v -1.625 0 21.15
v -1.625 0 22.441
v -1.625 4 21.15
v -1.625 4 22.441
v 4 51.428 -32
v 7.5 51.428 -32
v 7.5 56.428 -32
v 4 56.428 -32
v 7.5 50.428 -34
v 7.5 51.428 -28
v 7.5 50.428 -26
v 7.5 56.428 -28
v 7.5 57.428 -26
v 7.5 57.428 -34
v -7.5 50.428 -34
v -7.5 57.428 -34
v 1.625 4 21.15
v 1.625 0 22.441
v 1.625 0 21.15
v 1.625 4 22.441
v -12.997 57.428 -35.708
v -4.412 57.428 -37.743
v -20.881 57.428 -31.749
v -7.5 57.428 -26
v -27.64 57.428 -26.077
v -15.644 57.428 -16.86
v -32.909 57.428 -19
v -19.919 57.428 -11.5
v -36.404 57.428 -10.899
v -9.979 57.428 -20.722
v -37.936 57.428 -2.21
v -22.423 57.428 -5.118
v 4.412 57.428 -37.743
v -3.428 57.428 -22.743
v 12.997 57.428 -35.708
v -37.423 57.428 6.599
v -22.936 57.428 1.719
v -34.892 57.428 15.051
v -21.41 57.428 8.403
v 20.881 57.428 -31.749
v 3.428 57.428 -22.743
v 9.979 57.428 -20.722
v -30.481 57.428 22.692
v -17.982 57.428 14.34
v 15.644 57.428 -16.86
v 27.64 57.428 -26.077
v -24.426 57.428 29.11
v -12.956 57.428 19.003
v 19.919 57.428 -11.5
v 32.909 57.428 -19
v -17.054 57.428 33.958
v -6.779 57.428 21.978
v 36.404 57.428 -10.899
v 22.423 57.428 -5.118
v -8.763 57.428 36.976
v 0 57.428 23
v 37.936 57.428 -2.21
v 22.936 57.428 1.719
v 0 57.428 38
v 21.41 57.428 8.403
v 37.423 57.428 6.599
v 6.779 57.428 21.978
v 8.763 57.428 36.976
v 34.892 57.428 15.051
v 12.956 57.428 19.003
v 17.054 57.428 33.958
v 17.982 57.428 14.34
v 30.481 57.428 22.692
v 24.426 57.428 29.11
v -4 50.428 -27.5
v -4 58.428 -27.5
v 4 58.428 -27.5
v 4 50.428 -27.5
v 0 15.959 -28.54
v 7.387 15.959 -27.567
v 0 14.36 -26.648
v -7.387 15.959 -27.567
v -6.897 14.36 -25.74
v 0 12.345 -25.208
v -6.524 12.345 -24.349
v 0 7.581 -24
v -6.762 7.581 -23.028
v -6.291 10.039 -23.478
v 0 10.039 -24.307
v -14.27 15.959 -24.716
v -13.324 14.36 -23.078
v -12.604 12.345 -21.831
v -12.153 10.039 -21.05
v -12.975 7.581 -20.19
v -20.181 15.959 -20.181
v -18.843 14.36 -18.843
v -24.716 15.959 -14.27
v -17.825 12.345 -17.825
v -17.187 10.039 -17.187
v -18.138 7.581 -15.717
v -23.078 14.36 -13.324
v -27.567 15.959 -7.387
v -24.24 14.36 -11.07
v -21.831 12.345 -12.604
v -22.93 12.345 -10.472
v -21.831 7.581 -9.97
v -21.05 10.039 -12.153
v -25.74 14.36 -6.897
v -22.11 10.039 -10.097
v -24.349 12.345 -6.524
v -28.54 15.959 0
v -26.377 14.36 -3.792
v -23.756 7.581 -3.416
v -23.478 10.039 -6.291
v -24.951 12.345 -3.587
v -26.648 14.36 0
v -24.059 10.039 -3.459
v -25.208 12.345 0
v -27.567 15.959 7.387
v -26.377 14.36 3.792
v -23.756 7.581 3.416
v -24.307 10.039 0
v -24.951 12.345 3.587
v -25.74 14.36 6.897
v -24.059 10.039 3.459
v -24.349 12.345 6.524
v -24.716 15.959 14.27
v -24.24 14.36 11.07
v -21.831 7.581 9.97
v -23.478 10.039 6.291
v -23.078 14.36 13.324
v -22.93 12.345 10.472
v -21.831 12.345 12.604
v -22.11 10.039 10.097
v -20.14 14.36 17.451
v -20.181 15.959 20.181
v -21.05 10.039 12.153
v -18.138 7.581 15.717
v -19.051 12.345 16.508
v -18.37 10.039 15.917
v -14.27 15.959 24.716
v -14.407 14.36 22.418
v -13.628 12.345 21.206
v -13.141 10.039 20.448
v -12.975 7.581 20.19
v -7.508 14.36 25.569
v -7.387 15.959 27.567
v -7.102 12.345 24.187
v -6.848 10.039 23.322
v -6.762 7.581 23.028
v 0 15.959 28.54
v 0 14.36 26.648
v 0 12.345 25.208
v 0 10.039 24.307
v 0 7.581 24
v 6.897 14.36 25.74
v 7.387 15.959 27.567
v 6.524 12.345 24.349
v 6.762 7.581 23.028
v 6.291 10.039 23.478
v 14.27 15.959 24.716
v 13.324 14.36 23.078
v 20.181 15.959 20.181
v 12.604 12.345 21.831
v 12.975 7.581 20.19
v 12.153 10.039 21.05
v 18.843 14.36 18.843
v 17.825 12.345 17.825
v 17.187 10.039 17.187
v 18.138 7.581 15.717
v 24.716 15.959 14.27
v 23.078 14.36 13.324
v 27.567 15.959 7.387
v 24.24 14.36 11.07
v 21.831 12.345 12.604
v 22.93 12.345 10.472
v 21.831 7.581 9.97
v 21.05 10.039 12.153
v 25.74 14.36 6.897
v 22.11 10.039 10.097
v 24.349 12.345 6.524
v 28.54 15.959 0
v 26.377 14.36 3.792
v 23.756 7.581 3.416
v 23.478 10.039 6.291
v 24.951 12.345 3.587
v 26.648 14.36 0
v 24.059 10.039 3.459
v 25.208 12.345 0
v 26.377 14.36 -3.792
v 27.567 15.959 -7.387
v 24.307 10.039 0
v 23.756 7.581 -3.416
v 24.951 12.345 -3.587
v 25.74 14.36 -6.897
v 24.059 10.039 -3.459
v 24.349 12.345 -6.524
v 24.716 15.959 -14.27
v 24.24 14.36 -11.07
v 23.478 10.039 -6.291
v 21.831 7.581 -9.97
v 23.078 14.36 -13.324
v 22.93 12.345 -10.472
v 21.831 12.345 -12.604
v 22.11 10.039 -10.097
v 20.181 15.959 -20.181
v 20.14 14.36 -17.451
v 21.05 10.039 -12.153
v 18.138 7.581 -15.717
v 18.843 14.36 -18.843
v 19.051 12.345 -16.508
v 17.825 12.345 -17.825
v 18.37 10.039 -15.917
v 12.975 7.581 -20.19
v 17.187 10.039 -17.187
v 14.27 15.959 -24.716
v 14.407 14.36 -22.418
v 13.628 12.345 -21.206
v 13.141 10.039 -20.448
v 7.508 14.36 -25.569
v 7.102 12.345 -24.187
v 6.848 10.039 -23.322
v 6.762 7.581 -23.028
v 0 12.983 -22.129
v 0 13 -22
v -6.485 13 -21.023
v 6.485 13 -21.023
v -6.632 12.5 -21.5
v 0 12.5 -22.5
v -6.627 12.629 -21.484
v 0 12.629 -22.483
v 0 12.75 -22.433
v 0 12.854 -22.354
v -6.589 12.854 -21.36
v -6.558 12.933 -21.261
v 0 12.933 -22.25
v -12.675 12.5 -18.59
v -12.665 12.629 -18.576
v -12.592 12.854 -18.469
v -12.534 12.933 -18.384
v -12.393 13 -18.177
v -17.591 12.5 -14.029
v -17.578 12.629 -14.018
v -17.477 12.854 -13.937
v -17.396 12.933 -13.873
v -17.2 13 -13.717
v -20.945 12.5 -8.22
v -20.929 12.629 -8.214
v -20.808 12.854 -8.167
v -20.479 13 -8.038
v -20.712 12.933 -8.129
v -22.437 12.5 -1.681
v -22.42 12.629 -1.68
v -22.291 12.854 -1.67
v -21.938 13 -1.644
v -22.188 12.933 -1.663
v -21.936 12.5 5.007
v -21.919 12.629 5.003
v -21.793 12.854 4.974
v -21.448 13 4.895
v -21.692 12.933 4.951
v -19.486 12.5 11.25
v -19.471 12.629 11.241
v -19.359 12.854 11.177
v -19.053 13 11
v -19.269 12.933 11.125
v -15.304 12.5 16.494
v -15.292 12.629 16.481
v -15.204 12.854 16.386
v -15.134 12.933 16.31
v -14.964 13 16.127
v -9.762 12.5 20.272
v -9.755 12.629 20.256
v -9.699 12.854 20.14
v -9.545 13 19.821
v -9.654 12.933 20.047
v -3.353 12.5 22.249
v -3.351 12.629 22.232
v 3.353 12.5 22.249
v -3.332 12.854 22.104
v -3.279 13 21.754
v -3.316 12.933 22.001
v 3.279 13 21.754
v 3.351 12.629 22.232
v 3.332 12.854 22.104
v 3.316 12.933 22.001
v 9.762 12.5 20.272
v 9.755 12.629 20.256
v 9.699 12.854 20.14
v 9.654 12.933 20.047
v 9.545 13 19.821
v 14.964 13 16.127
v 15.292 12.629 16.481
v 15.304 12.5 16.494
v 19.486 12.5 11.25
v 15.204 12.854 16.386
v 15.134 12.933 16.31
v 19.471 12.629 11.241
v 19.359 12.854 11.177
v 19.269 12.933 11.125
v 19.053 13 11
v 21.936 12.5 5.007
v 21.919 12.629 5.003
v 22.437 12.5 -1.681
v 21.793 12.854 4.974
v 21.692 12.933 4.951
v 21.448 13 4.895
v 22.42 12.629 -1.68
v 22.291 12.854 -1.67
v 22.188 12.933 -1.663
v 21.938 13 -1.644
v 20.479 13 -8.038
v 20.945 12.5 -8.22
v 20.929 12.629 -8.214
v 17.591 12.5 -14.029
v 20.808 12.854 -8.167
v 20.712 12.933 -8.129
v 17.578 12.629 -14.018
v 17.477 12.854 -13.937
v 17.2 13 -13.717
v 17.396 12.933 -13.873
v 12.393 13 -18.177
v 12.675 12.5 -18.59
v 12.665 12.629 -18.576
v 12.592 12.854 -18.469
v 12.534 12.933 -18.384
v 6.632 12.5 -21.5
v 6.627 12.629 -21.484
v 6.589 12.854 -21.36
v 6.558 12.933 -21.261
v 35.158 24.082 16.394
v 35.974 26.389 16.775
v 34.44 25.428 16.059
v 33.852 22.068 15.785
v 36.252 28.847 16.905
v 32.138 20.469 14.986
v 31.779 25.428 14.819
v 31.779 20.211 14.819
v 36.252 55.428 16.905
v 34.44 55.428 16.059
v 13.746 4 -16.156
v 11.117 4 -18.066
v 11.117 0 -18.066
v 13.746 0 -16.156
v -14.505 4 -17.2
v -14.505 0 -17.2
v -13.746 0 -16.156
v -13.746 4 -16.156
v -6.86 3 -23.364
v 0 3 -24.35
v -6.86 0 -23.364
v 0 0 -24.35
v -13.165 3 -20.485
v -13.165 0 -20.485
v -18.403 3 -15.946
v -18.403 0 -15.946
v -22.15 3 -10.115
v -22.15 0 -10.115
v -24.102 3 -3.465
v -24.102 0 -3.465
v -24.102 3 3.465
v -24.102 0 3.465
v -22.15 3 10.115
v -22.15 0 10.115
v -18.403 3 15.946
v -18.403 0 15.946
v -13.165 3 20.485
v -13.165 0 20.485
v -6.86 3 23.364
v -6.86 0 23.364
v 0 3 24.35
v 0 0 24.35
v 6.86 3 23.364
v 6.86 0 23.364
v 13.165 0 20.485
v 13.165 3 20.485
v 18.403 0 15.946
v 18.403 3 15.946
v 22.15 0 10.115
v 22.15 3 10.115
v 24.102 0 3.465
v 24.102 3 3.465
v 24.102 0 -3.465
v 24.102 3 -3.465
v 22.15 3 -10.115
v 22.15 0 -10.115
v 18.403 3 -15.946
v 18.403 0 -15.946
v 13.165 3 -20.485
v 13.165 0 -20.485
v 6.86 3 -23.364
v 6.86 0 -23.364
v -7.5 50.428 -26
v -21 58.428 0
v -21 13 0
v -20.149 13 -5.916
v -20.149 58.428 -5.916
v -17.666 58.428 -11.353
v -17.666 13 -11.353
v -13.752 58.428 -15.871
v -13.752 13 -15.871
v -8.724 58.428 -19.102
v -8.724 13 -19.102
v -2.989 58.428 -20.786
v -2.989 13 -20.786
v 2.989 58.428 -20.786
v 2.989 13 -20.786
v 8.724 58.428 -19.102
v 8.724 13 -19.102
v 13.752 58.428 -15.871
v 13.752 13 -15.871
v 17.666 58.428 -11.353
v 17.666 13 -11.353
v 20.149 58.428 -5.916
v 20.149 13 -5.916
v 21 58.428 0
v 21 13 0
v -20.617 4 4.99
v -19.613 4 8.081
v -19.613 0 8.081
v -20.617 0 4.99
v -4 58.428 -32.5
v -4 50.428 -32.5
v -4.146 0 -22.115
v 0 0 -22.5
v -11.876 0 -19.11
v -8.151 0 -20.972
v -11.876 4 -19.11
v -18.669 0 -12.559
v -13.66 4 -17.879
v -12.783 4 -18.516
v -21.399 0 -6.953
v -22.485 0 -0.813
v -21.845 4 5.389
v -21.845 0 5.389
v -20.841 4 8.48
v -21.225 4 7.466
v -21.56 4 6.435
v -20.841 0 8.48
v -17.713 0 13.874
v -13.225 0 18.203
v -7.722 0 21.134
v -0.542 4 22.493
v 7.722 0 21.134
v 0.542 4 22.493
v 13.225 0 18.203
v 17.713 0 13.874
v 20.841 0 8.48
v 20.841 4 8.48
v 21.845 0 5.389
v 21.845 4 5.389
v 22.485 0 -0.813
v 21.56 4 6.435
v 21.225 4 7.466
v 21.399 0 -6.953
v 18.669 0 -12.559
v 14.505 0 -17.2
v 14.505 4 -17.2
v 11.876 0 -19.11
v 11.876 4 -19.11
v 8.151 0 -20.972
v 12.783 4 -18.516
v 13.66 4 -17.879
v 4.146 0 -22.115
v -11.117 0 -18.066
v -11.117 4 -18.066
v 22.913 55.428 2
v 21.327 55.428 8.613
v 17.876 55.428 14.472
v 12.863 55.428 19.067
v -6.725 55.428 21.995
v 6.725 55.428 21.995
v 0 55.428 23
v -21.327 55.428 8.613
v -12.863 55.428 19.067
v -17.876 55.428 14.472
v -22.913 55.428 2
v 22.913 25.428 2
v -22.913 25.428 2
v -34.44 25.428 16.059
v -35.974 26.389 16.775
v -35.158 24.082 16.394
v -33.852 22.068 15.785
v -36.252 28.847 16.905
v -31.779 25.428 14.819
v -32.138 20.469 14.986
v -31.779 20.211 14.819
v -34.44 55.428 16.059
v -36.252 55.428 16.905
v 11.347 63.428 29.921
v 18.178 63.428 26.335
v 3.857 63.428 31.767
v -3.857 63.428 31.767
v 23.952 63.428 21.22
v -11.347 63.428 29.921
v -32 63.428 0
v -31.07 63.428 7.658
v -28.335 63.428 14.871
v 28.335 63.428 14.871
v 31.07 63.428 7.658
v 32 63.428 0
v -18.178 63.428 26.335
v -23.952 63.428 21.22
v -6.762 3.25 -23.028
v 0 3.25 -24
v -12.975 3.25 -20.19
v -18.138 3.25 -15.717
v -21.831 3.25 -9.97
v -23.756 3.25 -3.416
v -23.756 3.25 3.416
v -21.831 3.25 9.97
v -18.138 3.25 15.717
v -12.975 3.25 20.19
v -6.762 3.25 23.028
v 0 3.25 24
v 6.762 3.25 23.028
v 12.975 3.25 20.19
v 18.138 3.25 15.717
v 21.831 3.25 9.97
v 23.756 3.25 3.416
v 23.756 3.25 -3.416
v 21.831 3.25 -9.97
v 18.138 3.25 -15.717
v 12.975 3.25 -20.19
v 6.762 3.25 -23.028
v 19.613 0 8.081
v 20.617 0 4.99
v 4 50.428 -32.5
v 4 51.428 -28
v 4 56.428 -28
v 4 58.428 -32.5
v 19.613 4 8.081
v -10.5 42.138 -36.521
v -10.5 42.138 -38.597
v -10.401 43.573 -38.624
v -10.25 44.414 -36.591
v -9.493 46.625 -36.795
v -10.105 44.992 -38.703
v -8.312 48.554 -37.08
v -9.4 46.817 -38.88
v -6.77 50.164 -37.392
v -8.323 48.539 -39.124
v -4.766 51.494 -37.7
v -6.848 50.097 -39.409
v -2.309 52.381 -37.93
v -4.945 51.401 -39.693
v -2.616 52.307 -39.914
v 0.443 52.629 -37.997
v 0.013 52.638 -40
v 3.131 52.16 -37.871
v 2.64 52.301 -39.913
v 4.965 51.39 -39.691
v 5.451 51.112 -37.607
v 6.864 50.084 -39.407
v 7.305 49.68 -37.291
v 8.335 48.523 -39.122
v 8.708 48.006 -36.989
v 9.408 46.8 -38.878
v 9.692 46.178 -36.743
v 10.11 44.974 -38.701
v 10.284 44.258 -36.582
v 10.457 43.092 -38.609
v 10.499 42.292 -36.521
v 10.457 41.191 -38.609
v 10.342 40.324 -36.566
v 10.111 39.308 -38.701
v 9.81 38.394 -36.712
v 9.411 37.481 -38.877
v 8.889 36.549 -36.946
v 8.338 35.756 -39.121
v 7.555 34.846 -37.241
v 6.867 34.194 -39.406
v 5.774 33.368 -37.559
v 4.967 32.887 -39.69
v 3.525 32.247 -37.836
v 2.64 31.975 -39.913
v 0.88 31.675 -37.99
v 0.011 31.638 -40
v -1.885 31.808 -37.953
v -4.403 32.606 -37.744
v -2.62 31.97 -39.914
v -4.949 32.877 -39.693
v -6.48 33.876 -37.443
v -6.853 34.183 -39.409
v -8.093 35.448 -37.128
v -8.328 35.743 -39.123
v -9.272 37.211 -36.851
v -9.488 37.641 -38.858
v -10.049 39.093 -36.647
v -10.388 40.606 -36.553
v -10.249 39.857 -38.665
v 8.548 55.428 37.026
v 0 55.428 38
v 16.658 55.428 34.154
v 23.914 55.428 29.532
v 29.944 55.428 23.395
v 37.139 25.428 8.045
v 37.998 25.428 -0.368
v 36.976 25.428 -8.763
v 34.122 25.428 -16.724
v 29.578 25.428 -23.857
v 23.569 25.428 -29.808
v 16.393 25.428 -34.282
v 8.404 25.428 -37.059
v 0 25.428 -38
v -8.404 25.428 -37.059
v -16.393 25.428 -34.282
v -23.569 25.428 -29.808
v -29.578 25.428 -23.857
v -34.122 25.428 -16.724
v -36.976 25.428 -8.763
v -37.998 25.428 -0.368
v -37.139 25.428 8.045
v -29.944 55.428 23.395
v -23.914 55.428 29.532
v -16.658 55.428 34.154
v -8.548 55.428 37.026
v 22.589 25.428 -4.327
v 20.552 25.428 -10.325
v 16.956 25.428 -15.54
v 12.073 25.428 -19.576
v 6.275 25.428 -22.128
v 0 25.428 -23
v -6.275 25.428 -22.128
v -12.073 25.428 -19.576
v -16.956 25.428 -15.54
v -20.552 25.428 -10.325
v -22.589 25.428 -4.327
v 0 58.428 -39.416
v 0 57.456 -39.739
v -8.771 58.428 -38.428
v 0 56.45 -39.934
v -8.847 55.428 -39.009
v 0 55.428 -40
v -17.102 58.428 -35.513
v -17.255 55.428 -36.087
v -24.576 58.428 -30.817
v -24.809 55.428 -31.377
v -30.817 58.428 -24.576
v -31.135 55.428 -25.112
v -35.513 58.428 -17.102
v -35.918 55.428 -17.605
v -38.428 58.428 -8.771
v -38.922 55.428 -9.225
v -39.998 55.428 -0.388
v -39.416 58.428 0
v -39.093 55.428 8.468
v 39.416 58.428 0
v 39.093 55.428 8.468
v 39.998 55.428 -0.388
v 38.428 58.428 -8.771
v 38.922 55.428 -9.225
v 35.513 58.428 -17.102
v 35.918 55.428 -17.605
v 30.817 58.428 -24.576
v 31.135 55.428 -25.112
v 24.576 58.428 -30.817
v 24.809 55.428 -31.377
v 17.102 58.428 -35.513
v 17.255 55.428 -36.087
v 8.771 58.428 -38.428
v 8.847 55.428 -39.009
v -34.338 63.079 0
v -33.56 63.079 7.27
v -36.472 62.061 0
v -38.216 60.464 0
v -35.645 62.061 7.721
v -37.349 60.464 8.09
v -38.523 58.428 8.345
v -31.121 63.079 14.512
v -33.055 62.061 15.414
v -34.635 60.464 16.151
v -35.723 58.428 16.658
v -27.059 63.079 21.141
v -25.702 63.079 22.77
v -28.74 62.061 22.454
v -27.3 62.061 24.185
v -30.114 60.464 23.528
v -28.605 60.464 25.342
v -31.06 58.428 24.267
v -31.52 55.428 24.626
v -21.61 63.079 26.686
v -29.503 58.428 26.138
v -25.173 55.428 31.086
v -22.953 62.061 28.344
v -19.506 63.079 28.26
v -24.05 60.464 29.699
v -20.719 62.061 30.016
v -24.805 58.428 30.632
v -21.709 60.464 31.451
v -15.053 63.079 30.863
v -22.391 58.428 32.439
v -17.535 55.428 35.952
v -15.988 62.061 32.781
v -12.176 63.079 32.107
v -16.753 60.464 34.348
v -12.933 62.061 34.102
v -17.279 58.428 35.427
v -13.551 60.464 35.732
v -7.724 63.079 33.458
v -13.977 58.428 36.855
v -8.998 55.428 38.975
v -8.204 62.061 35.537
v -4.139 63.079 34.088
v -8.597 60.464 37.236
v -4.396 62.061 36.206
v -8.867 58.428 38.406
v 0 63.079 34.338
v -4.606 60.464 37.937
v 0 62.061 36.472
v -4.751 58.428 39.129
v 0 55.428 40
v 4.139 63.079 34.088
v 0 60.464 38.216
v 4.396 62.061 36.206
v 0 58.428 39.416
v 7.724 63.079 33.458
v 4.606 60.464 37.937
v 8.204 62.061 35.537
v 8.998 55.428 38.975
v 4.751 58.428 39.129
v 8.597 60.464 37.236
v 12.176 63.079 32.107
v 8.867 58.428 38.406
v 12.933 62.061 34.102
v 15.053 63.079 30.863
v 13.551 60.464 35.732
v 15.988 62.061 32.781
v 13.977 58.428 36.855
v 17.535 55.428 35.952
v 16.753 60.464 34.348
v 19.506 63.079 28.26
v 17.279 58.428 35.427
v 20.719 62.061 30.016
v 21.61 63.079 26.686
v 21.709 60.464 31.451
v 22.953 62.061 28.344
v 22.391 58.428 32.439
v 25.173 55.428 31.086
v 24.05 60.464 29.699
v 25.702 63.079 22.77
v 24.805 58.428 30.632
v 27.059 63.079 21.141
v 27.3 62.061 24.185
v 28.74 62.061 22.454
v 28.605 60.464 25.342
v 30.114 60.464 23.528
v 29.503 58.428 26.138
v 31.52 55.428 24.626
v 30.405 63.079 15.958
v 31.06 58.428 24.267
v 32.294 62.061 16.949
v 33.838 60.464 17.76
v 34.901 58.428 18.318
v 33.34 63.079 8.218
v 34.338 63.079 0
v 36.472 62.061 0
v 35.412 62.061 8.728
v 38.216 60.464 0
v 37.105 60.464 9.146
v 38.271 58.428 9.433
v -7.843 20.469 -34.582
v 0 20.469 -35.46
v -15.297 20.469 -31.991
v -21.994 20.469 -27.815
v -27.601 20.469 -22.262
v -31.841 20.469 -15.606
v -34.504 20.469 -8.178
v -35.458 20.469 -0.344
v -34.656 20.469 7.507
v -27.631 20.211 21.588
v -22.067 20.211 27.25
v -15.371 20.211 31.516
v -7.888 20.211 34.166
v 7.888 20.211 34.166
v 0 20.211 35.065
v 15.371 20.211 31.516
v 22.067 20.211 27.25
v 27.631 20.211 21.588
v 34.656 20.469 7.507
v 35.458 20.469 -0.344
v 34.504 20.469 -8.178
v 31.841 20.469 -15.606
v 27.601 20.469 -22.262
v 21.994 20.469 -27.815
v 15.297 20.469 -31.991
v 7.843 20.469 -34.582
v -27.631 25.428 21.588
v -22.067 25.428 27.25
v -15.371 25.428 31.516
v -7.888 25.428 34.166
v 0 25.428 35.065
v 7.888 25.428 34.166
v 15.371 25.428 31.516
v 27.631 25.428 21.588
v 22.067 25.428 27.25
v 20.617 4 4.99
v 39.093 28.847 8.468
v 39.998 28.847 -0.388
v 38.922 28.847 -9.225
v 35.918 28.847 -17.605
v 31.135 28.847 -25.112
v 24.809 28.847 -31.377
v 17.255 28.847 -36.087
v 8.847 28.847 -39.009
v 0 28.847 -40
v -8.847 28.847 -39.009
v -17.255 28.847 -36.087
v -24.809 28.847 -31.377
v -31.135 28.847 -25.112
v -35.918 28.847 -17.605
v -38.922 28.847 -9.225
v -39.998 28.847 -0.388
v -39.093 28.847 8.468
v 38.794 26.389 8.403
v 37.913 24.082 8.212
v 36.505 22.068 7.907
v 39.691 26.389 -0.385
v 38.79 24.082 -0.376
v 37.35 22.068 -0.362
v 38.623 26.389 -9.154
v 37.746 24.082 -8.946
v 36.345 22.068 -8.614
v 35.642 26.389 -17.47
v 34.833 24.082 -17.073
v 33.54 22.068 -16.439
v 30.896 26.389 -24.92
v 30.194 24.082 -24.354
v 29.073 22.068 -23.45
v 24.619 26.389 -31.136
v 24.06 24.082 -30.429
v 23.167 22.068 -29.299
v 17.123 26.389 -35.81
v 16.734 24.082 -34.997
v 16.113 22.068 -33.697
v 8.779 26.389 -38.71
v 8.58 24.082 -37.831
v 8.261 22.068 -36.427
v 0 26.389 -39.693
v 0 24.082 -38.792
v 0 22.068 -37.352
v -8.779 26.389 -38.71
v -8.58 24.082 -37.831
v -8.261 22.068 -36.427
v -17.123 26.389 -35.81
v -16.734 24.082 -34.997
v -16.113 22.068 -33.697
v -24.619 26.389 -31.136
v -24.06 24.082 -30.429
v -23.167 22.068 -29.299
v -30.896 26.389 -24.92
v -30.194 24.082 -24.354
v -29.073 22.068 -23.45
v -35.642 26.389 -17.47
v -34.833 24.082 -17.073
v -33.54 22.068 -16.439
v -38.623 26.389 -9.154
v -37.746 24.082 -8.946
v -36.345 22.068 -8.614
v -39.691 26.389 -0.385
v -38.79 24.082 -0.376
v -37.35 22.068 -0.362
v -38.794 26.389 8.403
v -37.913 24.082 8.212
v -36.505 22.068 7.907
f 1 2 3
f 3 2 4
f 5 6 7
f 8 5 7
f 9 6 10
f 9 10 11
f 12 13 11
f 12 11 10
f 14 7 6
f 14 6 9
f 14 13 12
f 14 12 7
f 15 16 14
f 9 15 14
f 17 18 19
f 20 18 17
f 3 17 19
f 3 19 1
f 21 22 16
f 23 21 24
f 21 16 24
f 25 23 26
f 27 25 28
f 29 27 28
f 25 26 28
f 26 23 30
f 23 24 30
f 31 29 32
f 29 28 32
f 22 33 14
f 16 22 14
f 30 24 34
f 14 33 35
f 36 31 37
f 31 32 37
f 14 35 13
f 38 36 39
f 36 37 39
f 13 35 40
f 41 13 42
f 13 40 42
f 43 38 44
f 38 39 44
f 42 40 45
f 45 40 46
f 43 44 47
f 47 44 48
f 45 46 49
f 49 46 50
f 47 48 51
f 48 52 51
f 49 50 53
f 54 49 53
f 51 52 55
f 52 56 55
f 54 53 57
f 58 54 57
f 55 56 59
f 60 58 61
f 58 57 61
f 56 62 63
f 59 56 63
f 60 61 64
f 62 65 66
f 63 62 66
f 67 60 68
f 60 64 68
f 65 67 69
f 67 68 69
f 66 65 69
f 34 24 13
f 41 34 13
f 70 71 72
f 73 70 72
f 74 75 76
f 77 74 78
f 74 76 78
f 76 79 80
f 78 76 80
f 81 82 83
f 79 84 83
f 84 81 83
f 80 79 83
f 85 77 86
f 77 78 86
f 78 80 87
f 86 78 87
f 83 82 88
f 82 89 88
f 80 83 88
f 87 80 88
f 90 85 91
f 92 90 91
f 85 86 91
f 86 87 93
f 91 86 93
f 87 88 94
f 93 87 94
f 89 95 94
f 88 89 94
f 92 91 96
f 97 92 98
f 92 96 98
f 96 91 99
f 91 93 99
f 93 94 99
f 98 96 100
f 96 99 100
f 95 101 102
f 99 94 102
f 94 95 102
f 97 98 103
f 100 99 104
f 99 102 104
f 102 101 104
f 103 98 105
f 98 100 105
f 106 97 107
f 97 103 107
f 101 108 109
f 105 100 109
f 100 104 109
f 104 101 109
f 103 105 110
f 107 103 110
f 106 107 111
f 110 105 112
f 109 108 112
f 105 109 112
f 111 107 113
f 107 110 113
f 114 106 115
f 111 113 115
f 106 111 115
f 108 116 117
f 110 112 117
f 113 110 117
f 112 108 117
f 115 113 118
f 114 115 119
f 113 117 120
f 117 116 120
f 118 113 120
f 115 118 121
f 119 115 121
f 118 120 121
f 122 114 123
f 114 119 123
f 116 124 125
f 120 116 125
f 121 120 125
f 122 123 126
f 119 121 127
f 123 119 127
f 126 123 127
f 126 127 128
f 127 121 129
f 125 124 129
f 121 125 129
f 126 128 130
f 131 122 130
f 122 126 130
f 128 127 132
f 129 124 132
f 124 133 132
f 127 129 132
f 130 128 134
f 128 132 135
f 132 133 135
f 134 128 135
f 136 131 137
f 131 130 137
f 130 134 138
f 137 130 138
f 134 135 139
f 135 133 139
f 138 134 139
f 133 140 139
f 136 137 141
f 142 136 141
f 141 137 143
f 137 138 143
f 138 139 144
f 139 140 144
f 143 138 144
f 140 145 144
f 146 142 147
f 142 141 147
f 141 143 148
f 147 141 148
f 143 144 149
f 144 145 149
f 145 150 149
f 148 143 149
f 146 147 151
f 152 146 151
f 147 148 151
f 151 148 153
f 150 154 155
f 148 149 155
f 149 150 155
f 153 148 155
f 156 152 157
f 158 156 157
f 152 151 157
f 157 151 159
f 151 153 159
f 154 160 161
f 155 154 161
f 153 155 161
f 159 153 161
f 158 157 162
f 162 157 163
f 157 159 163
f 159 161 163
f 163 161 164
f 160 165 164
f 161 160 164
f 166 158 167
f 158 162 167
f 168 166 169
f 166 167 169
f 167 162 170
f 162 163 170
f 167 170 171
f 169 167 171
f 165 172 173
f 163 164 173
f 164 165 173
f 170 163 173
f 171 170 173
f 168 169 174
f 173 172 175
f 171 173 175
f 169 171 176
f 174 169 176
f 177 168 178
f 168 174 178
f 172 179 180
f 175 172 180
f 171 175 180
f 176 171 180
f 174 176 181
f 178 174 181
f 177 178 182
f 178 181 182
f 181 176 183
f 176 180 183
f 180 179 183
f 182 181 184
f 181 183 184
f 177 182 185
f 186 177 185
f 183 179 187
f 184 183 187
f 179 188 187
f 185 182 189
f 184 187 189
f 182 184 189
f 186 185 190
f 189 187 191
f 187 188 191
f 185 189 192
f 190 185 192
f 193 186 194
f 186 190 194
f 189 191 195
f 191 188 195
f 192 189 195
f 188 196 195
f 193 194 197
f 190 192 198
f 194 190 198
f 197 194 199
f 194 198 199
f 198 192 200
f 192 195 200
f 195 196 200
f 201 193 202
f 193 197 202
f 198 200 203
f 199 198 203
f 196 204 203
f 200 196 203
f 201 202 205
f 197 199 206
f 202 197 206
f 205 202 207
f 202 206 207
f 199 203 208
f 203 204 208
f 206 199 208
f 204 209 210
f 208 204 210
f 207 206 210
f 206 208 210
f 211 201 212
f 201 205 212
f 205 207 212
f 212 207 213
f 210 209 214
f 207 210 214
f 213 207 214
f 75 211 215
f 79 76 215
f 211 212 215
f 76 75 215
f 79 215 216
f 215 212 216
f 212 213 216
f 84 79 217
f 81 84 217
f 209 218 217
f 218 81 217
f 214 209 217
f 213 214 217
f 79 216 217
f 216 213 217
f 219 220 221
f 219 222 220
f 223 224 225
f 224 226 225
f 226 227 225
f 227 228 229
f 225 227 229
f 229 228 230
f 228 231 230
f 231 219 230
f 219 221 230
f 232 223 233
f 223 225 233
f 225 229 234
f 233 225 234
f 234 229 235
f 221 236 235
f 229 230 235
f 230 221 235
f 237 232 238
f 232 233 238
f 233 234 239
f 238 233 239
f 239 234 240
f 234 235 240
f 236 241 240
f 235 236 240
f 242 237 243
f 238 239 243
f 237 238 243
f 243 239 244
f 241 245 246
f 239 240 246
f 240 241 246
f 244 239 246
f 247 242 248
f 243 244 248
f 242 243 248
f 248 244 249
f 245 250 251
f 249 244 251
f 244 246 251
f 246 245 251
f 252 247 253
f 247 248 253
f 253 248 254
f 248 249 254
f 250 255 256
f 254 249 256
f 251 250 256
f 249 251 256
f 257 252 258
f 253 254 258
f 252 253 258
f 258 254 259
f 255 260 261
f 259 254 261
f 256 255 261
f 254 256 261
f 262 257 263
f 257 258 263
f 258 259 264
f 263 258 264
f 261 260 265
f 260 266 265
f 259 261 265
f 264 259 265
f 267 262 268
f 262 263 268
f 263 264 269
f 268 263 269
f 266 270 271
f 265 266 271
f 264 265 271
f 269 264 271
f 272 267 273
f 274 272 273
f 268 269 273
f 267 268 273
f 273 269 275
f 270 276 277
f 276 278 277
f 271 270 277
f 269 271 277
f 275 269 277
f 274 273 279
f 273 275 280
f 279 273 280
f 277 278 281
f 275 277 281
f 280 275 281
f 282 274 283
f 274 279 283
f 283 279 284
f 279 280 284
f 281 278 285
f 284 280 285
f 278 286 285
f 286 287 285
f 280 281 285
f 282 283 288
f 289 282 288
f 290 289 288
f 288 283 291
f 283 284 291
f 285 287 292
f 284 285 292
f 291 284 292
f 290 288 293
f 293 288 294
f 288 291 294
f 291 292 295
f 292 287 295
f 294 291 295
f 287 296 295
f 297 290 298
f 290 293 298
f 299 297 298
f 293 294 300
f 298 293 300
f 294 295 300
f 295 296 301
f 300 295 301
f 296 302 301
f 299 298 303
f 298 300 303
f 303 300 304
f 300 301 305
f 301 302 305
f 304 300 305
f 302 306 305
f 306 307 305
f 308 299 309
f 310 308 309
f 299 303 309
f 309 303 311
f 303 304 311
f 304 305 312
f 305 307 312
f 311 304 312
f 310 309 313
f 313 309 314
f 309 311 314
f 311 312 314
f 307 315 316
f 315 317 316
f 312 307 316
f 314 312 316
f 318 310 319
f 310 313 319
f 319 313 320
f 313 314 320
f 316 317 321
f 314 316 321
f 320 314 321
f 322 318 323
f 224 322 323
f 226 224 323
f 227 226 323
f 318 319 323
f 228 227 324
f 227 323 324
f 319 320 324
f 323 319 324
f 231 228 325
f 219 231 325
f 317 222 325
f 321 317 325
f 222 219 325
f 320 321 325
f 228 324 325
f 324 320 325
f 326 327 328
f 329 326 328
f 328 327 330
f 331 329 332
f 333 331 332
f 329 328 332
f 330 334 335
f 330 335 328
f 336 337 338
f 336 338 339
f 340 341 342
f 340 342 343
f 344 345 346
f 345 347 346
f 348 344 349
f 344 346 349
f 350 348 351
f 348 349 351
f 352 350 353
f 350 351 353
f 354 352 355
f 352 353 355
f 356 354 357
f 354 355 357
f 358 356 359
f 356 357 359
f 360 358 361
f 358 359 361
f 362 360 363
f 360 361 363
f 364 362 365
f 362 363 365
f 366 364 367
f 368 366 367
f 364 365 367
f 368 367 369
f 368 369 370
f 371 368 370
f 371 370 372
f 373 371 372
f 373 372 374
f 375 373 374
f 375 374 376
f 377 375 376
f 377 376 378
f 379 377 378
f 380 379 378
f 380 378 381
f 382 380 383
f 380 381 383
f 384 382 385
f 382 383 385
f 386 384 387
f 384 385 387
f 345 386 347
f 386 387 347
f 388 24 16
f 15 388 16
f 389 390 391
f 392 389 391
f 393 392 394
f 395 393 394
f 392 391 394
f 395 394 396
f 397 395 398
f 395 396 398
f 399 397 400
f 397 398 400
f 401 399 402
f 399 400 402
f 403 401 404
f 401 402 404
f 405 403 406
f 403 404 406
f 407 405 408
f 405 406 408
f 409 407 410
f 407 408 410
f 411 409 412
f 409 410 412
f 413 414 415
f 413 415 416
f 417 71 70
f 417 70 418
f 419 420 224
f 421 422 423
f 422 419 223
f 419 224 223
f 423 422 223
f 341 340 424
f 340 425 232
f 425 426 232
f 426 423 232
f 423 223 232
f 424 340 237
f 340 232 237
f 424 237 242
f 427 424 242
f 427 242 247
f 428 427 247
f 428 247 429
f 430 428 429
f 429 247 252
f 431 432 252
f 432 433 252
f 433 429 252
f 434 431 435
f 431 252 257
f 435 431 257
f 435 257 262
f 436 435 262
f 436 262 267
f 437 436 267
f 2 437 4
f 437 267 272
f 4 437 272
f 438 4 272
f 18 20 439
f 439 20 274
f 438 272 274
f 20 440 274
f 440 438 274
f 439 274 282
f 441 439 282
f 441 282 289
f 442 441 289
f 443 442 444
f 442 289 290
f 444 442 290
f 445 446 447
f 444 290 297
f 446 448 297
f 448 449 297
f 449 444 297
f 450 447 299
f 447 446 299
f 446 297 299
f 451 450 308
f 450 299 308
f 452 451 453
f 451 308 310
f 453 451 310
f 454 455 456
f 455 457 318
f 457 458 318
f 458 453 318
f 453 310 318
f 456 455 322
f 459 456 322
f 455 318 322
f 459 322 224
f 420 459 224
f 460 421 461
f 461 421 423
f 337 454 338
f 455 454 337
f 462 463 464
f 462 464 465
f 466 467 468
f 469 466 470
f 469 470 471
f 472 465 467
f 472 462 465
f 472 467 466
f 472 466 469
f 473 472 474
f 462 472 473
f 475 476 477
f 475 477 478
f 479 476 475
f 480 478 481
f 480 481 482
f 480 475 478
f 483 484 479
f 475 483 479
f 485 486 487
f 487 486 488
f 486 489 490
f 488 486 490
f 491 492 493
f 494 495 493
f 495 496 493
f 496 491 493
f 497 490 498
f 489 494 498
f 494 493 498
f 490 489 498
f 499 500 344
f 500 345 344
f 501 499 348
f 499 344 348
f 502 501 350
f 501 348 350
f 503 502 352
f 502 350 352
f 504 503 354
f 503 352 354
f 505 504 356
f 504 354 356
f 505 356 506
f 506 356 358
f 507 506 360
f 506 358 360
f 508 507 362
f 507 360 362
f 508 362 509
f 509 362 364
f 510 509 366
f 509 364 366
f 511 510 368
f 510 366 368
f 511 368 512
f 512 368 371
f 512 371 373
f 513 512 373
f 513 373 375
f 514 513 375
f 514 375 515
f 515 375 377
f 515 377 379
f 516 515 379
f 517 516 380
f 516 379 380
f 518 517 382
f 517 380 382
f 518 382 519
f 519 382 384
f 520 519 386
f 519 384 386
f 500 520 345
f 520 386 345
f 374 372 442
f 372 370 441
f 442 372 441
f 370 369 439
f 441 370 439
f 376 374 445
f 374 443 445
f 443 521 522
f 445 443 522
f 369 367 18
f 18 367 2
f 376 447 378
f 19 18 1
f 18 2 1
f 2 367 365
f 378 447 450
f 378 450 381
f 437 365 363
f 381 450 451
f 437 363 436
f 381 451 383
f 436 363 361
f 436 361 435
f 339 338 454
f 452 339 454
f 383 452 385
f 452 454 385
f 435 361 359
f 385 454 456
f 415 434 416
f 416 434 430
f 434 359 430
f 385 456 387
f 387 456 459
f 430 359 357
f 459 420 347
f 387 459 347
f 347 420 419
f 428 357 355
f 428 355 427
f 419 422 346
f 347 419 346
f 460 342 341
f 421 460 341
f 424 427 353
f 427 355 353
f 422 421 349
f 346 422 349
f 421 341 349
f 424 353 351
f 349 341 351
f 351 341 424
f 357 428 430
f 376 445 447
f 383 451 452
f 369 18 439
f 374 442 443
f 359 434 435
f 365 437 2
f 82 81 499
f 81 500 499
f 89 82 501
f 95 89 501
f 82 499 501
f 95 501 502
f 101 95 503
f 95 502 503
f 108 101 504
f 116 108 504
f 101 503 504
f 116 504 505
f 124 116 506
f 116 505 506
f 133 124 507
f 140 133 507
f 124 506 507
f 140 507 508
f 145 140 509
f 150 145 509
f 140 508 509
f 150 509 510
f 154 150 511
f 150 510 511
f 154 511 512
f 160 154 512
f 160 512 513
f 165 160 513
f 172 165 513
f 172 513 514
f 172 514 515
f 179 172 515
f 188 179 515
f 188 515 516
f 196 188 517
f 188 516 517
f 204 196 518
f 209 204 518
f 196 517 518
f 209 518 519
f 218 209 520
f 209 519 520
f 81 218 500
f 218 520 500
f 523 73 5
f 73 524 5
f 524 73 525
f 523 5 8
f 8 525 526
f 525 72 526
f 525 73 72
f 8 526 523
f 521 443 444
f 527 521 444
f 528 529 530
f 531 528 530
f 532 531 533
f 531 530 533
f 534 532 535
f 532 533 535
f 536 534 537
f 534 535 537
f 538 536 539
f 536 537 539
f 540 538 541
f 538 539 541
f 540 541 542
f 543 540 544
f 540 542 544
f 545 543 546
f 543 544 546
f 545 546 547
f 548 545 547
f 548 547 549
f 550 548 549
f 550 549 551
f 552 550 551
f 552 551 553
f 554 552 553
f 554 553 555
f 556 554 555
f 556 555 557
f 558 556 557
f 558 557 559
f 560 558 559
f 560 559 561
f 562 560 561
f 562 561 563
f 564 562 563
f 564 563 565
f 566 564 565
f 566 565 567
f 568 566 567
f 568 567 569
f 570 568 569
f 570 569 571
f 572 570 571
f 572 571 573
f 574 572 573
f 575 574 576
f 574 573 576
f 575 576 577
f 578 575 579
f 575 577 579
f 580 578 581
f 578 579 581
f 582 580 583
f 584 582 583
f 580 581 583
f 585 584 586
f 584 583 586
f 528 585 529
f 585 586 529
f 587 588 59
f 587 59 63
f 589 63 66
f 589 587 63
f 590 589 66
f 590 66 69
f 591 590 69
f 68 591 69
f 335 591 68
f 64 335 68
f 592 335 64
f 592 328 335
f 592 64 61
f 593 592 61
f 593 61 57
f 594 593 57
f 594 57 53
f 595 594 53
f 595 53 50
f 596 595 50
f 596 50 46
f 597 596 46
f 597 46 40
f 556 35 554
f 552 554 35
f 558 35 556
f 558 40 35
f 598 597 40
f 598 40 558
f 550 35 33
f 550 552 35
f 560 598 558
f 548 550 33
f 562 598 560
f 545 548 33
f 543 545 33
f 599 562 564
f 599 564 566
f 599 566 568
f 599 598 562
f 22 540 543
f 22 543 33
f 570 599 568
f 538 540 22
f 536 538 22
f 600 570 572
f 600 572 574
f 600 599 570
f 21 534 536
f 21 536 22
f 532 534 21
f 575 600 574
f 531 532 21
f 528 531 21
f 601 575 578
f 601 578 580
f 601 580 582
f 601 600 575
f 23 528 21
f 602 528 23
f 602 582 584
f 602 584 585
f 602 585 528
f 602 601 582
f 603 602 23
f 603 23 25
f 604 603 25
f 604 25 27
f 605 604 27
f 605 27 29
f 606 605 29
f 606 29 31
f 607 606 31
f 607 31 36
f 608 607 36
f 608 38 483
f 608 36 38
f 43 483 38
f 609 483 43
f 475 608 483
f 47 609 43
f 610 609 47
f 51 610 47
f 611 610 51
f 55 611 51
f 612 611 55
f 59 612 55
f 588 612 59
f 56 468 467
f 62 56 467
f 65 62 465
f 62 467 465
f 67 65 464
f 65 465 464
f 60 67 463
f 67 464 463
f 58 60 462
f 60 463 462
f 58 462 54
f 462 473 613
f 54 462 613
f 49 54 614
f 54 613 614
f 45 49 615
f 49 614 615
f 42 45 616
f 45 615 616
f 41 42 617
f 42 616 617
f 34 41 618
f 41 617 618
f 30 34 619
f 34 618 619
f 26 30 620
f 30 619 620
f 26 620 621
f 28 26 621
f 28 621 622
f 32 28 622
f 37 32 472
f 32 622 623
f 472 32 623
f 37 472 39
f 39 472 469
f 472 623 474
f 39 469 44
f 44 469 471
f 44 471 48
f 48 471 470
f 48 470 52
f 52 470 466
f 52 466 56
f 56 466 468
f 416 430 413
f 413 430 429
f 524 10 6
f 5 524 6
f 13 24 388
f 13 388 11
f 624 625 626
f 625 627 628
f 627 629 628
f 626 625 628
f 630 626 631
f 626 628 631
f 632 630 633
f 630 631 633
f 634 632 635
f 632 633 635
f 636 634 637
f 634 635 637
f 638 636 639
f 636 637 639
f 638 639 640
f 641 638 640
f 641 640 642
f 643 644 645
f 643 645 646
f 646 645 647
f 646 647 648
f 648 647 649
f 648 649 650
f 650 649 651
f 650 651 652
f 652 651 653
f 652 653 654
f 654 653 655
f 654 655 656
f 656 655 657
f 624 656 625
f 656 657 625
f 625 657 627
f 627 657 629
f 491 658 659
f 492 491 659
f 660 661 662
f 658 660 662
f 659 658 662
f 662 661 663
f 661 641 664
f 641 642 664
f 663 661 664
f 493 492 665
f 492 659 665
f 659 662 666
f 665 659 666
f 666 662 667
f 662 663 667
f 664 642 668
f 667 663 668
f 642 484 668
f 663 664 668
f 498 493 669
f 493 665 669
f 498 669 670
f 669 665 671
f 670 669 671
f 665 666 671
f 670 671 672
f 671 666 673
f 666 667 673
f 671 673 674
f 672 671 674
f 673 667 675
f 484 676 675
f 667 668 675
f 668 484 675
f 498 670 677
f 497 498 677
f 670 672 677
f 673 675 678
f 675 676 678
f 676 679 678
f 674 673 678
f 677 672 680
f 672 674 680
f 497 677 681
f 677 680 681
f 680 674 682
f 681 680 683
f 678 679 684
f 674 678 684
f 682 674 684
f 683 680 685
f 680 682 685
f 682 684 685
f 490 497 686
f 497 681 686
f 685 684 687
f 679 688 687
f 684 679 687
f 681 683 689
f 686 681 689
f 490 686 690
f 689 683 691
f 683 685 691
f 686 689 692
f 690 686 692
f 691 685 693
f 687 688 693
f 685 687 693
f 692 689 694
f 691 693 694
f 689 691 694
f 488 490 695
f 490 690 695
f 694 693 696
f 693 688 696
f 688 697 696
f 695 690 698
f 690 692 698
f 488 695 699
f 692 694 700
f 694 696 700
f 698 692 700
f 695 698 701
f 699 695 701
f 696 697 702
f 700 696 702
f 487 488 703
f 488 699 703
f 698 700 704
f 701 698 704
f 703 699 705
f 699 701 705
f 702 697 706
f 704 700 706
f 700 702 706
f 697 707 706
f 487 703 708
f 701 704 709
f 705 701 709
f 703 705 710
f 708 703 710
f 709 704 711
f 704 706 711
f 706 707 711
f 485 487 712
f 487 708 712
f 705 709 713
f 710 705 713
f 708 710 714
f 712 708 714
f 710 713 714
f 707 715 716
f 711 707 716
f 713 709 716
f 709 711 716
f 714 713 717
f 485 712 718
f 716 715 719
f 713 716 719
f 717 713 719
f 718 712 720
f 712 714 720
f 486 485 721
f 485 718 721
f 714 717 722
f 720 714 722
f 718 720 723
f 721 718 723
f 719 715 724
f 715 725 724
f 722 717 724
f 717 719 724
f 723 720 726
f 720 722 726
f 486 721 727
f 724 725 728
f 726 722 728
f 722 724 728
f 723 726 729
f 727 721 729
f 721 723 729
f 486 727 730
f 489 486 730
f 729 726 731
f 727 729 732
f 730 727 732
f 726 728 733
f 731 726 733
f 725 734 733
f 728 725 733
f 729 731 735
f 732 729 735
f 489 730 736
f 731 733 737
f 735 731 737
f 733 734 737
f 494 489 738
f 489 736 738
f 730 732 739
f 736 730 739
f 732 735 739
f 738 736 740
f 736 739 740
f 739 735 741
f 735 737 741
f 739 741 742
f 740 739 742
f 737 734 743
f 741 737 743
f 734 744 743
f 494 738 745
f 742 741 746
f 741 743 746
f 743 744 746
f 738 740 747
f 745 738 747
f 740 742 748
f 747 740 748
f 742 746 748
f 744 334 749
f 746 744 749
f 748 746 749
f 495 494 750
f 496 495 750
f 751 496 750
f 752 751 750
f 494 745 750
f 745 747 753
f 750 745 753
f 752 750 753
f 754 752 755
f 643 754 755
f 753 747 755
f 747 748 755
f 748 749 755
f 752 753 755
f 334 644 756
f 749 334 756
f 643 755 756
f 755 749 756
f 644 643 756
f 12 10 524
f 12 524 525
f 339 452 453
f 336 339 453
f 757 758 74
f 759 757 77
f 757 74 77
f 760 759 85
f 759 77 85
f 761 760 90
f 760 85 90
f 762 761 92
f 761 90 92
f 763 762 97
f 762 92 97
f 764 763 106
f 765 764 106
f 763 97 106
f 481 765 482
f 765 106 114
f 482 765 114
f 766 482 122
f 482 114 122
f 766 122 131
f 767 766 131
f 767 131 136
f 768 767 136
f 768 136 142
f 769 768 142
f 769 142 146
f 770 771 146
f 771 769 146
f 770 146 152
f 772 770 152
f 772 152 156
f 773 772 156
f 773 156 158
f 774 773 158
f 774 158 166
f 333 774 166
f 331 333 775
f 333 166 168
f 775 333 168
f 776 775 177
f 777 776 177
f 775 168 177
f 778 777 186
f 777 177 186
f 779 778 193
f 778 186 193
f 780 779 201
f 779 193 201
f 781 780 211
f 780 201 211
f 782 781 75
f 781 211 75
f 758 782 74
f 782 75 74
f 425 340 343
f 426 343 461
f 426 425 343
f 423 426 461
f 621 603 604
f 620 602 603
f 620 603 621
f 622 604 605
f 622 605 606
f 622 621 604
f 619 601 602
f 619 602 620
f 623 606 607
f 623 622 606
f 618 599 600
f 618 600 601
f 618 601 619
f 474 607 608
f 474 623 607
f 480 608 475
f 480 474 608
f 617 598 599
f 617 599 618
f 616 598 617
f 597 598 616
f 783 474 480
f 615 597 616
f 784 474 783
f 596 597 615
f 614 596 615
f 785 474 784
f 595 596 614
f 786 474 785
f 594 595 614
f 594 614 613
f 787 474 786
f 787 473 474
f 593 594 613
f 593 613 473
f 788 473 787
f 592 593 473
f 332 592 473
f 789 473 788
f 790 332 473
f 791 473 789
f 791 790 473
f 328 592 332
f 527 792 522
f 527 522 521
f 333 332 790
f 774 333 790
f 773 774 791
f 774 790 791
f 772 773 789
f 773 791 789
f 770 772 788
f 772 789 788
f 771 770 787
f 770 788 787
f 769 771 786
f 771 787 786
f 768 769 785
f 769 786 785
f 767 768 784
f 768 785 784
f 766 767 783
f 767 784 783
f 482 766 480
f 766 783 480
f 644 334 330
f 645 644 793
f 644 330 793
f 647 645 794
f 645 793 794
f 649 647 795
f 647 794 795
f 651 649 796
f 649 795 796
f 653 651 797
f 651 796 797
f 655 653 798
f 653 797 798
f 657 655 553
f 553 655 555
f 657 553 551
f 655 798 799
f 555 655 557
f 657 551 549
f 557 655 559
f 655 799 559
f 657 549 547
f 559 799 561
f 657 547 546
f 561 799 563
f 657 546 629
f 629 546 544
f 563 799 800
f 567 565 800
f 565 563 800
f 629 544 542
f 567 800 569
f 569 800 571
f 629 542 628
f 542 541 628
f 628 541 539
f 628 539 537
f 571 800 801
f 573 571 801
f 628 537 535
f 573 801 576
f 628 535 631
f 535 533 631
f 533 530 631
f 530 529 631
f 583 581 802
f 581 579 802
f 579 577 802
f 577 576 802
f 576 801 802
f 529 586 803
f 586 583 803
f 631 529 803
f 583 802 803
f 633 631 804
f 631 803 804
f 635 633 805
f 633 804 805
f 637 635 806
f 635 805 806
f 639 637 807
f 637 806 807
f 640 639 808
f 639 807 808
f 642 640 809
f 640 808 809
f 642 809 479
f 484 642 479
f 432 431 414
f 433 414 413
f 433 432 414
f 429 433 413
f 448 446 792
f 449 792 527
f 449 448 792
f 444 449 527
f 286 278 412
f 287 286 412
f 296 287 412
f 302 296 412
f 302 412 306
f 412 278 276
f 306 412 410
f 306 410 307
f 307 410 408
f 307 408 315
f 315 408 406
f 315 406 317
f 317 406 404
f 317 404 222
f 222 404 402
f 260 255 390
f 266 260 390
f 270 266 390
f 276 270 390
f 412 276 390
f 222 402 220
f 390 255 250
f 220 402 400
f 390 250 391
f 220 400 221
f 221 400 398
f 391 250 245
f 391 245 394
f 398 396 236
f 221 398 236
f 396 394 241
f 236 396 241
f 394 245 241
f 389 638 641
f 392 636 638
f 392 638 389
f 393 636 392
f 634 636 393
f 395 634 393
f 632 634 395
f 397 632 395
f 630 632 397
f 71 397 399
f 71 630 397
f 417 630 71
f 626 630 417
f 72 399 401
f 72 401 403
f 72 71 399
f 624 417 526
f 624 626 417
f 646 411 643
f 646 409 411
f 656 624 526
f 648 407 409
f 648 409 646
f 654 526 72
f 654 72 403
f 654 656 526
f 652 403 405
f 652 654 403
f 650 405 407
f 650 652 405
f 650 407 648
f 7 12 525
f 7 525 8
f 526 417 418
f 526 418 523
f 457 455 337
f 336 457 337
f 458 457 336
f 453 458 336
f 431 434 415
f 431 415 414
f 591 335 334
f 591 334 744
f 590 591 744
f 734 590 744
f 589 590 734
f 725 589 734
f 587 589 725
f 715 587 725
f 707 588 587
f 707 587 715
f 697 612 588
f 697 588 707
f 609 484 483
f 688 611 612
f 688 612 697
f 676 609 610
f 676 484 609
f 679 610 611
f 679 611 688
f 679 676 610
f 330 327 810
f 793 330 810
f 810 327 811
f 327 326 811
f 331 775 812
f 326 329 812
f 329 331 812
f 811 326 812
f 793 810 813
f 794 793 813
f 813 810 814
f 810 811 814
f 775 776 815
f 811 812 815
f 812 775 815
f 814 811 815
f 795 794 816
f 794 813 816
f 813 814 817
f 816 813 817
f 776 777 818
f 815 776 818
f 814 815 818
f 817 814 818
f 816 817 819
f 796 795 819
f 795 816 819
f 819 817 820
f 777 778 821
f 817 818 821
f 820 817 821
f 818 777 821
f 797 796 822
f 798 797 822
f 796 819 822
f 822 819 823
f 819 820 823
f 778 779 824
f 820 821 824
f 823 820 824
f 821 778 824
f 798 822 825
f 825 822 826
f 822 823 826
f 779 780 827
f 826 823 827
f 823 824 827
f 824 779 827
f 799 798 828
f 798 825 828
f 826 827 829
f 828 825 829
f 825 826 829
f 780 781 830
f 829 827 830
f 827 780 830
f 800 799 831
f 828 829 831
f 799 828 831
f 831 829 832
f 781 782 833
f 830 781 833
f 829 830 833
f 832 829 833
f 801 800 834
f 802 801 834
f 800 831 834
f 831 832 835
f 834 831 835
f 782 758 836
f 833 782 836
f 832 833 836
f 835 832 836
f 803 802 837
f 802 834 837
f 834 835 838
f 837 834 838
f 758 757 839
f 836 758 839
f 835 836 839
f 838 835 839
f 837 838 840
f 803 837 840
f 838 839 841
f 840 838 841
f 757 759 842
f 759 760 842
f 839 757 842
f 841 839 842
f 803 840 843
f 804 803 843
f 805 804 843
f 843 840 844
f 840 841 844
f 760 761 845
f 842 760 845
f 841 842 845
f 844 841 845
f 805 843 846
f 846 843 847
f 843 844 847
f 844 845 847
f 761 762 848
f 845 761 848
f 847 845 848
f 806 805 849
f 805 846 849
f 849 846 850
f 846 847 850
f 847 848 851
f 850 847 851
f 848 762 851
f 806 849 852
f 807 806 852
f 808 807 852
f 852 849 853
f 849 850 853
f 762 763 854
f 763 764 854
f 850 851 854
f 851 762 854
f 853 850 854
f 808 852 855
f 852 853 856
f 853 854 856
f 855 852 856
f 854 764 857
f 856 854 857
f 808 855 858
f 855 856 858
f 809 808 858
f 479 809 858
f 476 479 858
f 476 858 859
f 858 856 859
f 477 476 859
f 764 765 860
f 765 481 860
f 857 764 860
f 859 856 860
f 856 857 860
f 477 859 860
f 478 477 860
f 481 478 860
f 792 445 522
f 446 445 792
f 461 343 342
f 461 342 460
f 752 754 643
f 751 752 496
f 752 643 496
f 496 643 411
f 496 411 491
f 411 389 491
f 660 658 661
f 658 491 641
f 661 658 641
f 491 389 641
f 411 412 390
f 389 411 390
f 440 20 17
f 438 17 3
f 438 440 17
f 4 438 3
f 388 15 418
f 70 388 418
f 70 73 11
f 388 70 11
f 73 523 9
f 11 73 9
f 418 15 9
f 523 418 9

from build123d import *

# Parameters (mm, degrees)
CUT_EXTRUDE3_DEPTH           = 60
CUT_EXTRUDE5_DEPTH           = 2
CUT_EXTRUDE5_DEPTH_BACK      = 30
SKETCH9_R                    = 38
SKETCH9_R_2                  = 23
SKETCH19_W                   = 12
SKETCH19_H                   = 36.5
CUT_REVOLVE2_ANGLE           = 65
CUT_REVOLVE2_OTHER_WAY_ANGLE = 65
SKETCH21_W                   = 3.25
SKETCH21_H                   = 4
BOSS_EXTRUDE3_DEPTH          = 1.35
CIRPATTERN1_COUNT            = 5
CUT_EXTRUDE9_START           = -5
CUT_EXTRUDE9_DEPTH           = 5
SKETCH23_R                   = 10.5
CUT_EXTRUDE10_DEPTH          = 10
SKETCH24_W                   = 15
SKETCH24_H                   = 8
BOSS_EXTRUDE4_DEPTH          = 8
SKETCH26_W                   = 8
SKETCH26_H                   = 5
CUT_EXTRUDE11_DEPTH          = 10
SKETCH27_W                   = 4
SKETCH27_H                   = 5
CUT_EXTRUDE12_DEPTH          = 5
CUT_EXTRUDE14_DEPTH          = 30


with BuildPart() as part:
    # Sketch1 → Revolve1 (revolve)
    with BuildSketch(Plane.XY):
        with BuildLine():
            Line((0, 63.427876097), (32, 63.427876097))
            ThreePointArc((32, 63.427876097), (37.656854249, 61.084730346), (40, 55.427876097))
            Line((40, 55.427876097), (40, 28.846818009))
            ThreePointArc((40, 28.846818009), (38.792081772, 24.082439968), (35.460140376, 20.469057744))
            Line((35.460140376, 20.469057744), (28.539859624, 15.958818353))
            ThreePointArc((28.539859624, 15.958818353), (25.207918228, 12.345436129), (24, 7.581058088))
            Line((24, 7.581058088), (24, 3.25))
            Line((24, 3.25), (24.35, 3))
            Line((24.35, 3), (24.35, 0))
            Line((24.35, 0), (22.5, 0))
            Line((22.5, 0), (22.5, 12.5))
            ThreePointArc((22.5, 12.5), (22.353553391, 12.853553391), (22, 13))
            Line((22, 13), (0, 13))
            Line((0, 13), (0, 63.427876097))
        make_face()
    revolve(axis=Axis((0, 0, 0), (0, 1, 0)))

    # Sketch11 → Cut-Extrude3 (cut)
    with BuildSketch(Plane(origin=(0, 13, 0), x_dir=(-1, 0, 0), z_dir=(0, -1, 0))):
        with BuildLine():
            Line((-21, 0), (21, 0))
            ThreePointArc((21, 0), (0, 21), (-21, 0))
        make_face()
    extrude(amount=-CUT_EXTRUDE3_DEPTH, mode=Mode.SUBTRACT)

    # Sketch9 → Cut-Extrude5 (cut, two sides: drawn at the far end of the back side and taken through both)
    with BuildSketch(Plane(origin=(0, 55.427876097, 0), x_dir=(1, 0, 0), z_dir=(0, 1, 0)).offset(-CUT_EXTRUDE5_DEPTH_BACK)):
        Circle(SKETCH9_R)
        Circle(SKETCH9_R_2, mode=Mode.SUBTRACT)
    extrude(amount=CUT_EXTRUDE5_DEPTH + CUT_EXTRUDE5_DEPTH_BACK, mode=Mode.SUBTRACT)

    # Sketch19 → Cut-Revolve2 (revolve, cut)
    with BuildSketch(Plane(origin=(0, 0, 0), x_dir=(0, 0, -1), z_dir=(1, 0, 0))):
        with Locations((-41.064715832, 37.177876097)):
            Rectangle(SKETCH19_W, SKETCH19_H)
    revolve(axis=Axis((0, 0, 0), (0, 1, 0)), revolution_arc=CUT_REVOLVE2_ANGLE, mode=Mode.SUBTRACT)

    # Sketch19 → Cut-Revolve2 other way (revolve, cut)
    with BuildSketch(Plane(origin=(0, 0, 0), x_dir=(0, 0, -1), z_dir=(1, 0, 0))):
        with Locations((-41.064715832, 37.177876097)):
            Rectangle(SKETCH19_W, SKETCH19_H)
    revolve(axis=Axis((0, 0, 0), (0, -1, 0)), revolution_arc=CUT_REVOLVE2_OTHER_WAY_ANGLE, mode=Mode.SUBTRACT)

    # Sketch21 → Boss-Extrude3 (add)
    with BuildSketch(Plane(origin=(0, 0, 22.5), x_dir=(-1, 0, 0), z_dir=(0, 0, -1))):
        with Locations((0, 2)):
            Rectangle(SKETCH21_W, SKETCH21_H)
    boss_extrude3 = extrude(amount=BOSS_EXTRUDE3_DEPTH)

    # CirPattern1: Boss-Extrude3 ×5 about axis
    cirpattern1_axis = Axis((0, 0, 0), (0, -1, 0))
    for i in range(1, CIRPATTERN1_COUNT):
        add(boss_extrude3.rotate(cirpattern1_axis, i * 360 / CIRPATTERN1_COUNT))

    # Sketch22 → Cut-Extrude9 (cut)
    with BuildSketch(Plane(origin=(0, 63.427876097, 0), x_dir=(1, 0, 0), z_dir=(0, 1, 0)).offset(CUT_EXTRUDE9_START)):
        with BuildLine():
            Line((-40, 0), (40, 0))
            ThreePointArc((40, 0), (0, 40), (-40, 0))
        make_face()
    extrude(amount=CUT_EXTRUDE9_DEPTH, mode=Mode.SUBTRACT)

    # Sketch23 → Cut-Extrude10 (cut)
    with BuildSketch(Plane(origin=(0, 0, -40), x_dir=(-1, 0, 0), z_dir=(0, 0, -1))):
        with Locations((0, 42.137876097)):
            Circle(SKETCH23_R)
    extrude(amount=-CUT_EXTRUDE10_DEPTH, mode=Mode.SUBTRACT)

    # Sketch24 → Boss-Extrude4 (add)
    with BuildSketch(Plane(origin=(0, 58.427876097, 0), x_dir=(1, 0, 0), z_dir=(0, 1, 0))):
        with Locations((0, 30)):
            Rectangle(SKETCH24_W, SKETCH24_H)
    extrude(amount=-BOSS_EXTRUDE4_DEPTH)

    # Sketch26 → Cut-Extrude11 (cut)
    with BuildSketch(Plane(origin=(0, 58.427876097, 0), x_dir=(1, 0, 0), z_dir=(0, 1, 0))):
        with Locations((0, 30)):
            Rectangle(SKETCH26_W, SKETCH26_H)
    extrude(amount=-CUT_EXTRUDE11_DEPTH, mode=Mode.SUBTRACT)

    # Sketch27 → Cut-Extrude12 (cut)
    with BuildSketch(Plane(origin=(7.5, 0, 0), x_dir=(0, 0, -1), z_dir=(1, 0, 0))):
        with Locations((30, 53.927876097)):
            Rectangle(SKETCH27_W, SKETCH27_H)
    extrude(amount=-CUT_EXTRUDE12_DEPTH, mode=Mode.SUBTRACT)

    # Sketch28 → Cut-Extrude14 (cut)
    with BuildSketch(Plane(origin=(0, 55.427876097, 0), x_dir=(1, 0, 0), z_dir=(0, 1, 0))):
        with BuildLine():
            Line((-22.912878475, -2), (22.912878475, -2))
            ThreePointArc((22.912878475, -2), (0, -23), (-22.912878475, -2))
        make_face()
    extrude(amount=-CUT_EXTRUDE14_DEPTH, mode=Mode.SUBTRACT)


solid = part.part
